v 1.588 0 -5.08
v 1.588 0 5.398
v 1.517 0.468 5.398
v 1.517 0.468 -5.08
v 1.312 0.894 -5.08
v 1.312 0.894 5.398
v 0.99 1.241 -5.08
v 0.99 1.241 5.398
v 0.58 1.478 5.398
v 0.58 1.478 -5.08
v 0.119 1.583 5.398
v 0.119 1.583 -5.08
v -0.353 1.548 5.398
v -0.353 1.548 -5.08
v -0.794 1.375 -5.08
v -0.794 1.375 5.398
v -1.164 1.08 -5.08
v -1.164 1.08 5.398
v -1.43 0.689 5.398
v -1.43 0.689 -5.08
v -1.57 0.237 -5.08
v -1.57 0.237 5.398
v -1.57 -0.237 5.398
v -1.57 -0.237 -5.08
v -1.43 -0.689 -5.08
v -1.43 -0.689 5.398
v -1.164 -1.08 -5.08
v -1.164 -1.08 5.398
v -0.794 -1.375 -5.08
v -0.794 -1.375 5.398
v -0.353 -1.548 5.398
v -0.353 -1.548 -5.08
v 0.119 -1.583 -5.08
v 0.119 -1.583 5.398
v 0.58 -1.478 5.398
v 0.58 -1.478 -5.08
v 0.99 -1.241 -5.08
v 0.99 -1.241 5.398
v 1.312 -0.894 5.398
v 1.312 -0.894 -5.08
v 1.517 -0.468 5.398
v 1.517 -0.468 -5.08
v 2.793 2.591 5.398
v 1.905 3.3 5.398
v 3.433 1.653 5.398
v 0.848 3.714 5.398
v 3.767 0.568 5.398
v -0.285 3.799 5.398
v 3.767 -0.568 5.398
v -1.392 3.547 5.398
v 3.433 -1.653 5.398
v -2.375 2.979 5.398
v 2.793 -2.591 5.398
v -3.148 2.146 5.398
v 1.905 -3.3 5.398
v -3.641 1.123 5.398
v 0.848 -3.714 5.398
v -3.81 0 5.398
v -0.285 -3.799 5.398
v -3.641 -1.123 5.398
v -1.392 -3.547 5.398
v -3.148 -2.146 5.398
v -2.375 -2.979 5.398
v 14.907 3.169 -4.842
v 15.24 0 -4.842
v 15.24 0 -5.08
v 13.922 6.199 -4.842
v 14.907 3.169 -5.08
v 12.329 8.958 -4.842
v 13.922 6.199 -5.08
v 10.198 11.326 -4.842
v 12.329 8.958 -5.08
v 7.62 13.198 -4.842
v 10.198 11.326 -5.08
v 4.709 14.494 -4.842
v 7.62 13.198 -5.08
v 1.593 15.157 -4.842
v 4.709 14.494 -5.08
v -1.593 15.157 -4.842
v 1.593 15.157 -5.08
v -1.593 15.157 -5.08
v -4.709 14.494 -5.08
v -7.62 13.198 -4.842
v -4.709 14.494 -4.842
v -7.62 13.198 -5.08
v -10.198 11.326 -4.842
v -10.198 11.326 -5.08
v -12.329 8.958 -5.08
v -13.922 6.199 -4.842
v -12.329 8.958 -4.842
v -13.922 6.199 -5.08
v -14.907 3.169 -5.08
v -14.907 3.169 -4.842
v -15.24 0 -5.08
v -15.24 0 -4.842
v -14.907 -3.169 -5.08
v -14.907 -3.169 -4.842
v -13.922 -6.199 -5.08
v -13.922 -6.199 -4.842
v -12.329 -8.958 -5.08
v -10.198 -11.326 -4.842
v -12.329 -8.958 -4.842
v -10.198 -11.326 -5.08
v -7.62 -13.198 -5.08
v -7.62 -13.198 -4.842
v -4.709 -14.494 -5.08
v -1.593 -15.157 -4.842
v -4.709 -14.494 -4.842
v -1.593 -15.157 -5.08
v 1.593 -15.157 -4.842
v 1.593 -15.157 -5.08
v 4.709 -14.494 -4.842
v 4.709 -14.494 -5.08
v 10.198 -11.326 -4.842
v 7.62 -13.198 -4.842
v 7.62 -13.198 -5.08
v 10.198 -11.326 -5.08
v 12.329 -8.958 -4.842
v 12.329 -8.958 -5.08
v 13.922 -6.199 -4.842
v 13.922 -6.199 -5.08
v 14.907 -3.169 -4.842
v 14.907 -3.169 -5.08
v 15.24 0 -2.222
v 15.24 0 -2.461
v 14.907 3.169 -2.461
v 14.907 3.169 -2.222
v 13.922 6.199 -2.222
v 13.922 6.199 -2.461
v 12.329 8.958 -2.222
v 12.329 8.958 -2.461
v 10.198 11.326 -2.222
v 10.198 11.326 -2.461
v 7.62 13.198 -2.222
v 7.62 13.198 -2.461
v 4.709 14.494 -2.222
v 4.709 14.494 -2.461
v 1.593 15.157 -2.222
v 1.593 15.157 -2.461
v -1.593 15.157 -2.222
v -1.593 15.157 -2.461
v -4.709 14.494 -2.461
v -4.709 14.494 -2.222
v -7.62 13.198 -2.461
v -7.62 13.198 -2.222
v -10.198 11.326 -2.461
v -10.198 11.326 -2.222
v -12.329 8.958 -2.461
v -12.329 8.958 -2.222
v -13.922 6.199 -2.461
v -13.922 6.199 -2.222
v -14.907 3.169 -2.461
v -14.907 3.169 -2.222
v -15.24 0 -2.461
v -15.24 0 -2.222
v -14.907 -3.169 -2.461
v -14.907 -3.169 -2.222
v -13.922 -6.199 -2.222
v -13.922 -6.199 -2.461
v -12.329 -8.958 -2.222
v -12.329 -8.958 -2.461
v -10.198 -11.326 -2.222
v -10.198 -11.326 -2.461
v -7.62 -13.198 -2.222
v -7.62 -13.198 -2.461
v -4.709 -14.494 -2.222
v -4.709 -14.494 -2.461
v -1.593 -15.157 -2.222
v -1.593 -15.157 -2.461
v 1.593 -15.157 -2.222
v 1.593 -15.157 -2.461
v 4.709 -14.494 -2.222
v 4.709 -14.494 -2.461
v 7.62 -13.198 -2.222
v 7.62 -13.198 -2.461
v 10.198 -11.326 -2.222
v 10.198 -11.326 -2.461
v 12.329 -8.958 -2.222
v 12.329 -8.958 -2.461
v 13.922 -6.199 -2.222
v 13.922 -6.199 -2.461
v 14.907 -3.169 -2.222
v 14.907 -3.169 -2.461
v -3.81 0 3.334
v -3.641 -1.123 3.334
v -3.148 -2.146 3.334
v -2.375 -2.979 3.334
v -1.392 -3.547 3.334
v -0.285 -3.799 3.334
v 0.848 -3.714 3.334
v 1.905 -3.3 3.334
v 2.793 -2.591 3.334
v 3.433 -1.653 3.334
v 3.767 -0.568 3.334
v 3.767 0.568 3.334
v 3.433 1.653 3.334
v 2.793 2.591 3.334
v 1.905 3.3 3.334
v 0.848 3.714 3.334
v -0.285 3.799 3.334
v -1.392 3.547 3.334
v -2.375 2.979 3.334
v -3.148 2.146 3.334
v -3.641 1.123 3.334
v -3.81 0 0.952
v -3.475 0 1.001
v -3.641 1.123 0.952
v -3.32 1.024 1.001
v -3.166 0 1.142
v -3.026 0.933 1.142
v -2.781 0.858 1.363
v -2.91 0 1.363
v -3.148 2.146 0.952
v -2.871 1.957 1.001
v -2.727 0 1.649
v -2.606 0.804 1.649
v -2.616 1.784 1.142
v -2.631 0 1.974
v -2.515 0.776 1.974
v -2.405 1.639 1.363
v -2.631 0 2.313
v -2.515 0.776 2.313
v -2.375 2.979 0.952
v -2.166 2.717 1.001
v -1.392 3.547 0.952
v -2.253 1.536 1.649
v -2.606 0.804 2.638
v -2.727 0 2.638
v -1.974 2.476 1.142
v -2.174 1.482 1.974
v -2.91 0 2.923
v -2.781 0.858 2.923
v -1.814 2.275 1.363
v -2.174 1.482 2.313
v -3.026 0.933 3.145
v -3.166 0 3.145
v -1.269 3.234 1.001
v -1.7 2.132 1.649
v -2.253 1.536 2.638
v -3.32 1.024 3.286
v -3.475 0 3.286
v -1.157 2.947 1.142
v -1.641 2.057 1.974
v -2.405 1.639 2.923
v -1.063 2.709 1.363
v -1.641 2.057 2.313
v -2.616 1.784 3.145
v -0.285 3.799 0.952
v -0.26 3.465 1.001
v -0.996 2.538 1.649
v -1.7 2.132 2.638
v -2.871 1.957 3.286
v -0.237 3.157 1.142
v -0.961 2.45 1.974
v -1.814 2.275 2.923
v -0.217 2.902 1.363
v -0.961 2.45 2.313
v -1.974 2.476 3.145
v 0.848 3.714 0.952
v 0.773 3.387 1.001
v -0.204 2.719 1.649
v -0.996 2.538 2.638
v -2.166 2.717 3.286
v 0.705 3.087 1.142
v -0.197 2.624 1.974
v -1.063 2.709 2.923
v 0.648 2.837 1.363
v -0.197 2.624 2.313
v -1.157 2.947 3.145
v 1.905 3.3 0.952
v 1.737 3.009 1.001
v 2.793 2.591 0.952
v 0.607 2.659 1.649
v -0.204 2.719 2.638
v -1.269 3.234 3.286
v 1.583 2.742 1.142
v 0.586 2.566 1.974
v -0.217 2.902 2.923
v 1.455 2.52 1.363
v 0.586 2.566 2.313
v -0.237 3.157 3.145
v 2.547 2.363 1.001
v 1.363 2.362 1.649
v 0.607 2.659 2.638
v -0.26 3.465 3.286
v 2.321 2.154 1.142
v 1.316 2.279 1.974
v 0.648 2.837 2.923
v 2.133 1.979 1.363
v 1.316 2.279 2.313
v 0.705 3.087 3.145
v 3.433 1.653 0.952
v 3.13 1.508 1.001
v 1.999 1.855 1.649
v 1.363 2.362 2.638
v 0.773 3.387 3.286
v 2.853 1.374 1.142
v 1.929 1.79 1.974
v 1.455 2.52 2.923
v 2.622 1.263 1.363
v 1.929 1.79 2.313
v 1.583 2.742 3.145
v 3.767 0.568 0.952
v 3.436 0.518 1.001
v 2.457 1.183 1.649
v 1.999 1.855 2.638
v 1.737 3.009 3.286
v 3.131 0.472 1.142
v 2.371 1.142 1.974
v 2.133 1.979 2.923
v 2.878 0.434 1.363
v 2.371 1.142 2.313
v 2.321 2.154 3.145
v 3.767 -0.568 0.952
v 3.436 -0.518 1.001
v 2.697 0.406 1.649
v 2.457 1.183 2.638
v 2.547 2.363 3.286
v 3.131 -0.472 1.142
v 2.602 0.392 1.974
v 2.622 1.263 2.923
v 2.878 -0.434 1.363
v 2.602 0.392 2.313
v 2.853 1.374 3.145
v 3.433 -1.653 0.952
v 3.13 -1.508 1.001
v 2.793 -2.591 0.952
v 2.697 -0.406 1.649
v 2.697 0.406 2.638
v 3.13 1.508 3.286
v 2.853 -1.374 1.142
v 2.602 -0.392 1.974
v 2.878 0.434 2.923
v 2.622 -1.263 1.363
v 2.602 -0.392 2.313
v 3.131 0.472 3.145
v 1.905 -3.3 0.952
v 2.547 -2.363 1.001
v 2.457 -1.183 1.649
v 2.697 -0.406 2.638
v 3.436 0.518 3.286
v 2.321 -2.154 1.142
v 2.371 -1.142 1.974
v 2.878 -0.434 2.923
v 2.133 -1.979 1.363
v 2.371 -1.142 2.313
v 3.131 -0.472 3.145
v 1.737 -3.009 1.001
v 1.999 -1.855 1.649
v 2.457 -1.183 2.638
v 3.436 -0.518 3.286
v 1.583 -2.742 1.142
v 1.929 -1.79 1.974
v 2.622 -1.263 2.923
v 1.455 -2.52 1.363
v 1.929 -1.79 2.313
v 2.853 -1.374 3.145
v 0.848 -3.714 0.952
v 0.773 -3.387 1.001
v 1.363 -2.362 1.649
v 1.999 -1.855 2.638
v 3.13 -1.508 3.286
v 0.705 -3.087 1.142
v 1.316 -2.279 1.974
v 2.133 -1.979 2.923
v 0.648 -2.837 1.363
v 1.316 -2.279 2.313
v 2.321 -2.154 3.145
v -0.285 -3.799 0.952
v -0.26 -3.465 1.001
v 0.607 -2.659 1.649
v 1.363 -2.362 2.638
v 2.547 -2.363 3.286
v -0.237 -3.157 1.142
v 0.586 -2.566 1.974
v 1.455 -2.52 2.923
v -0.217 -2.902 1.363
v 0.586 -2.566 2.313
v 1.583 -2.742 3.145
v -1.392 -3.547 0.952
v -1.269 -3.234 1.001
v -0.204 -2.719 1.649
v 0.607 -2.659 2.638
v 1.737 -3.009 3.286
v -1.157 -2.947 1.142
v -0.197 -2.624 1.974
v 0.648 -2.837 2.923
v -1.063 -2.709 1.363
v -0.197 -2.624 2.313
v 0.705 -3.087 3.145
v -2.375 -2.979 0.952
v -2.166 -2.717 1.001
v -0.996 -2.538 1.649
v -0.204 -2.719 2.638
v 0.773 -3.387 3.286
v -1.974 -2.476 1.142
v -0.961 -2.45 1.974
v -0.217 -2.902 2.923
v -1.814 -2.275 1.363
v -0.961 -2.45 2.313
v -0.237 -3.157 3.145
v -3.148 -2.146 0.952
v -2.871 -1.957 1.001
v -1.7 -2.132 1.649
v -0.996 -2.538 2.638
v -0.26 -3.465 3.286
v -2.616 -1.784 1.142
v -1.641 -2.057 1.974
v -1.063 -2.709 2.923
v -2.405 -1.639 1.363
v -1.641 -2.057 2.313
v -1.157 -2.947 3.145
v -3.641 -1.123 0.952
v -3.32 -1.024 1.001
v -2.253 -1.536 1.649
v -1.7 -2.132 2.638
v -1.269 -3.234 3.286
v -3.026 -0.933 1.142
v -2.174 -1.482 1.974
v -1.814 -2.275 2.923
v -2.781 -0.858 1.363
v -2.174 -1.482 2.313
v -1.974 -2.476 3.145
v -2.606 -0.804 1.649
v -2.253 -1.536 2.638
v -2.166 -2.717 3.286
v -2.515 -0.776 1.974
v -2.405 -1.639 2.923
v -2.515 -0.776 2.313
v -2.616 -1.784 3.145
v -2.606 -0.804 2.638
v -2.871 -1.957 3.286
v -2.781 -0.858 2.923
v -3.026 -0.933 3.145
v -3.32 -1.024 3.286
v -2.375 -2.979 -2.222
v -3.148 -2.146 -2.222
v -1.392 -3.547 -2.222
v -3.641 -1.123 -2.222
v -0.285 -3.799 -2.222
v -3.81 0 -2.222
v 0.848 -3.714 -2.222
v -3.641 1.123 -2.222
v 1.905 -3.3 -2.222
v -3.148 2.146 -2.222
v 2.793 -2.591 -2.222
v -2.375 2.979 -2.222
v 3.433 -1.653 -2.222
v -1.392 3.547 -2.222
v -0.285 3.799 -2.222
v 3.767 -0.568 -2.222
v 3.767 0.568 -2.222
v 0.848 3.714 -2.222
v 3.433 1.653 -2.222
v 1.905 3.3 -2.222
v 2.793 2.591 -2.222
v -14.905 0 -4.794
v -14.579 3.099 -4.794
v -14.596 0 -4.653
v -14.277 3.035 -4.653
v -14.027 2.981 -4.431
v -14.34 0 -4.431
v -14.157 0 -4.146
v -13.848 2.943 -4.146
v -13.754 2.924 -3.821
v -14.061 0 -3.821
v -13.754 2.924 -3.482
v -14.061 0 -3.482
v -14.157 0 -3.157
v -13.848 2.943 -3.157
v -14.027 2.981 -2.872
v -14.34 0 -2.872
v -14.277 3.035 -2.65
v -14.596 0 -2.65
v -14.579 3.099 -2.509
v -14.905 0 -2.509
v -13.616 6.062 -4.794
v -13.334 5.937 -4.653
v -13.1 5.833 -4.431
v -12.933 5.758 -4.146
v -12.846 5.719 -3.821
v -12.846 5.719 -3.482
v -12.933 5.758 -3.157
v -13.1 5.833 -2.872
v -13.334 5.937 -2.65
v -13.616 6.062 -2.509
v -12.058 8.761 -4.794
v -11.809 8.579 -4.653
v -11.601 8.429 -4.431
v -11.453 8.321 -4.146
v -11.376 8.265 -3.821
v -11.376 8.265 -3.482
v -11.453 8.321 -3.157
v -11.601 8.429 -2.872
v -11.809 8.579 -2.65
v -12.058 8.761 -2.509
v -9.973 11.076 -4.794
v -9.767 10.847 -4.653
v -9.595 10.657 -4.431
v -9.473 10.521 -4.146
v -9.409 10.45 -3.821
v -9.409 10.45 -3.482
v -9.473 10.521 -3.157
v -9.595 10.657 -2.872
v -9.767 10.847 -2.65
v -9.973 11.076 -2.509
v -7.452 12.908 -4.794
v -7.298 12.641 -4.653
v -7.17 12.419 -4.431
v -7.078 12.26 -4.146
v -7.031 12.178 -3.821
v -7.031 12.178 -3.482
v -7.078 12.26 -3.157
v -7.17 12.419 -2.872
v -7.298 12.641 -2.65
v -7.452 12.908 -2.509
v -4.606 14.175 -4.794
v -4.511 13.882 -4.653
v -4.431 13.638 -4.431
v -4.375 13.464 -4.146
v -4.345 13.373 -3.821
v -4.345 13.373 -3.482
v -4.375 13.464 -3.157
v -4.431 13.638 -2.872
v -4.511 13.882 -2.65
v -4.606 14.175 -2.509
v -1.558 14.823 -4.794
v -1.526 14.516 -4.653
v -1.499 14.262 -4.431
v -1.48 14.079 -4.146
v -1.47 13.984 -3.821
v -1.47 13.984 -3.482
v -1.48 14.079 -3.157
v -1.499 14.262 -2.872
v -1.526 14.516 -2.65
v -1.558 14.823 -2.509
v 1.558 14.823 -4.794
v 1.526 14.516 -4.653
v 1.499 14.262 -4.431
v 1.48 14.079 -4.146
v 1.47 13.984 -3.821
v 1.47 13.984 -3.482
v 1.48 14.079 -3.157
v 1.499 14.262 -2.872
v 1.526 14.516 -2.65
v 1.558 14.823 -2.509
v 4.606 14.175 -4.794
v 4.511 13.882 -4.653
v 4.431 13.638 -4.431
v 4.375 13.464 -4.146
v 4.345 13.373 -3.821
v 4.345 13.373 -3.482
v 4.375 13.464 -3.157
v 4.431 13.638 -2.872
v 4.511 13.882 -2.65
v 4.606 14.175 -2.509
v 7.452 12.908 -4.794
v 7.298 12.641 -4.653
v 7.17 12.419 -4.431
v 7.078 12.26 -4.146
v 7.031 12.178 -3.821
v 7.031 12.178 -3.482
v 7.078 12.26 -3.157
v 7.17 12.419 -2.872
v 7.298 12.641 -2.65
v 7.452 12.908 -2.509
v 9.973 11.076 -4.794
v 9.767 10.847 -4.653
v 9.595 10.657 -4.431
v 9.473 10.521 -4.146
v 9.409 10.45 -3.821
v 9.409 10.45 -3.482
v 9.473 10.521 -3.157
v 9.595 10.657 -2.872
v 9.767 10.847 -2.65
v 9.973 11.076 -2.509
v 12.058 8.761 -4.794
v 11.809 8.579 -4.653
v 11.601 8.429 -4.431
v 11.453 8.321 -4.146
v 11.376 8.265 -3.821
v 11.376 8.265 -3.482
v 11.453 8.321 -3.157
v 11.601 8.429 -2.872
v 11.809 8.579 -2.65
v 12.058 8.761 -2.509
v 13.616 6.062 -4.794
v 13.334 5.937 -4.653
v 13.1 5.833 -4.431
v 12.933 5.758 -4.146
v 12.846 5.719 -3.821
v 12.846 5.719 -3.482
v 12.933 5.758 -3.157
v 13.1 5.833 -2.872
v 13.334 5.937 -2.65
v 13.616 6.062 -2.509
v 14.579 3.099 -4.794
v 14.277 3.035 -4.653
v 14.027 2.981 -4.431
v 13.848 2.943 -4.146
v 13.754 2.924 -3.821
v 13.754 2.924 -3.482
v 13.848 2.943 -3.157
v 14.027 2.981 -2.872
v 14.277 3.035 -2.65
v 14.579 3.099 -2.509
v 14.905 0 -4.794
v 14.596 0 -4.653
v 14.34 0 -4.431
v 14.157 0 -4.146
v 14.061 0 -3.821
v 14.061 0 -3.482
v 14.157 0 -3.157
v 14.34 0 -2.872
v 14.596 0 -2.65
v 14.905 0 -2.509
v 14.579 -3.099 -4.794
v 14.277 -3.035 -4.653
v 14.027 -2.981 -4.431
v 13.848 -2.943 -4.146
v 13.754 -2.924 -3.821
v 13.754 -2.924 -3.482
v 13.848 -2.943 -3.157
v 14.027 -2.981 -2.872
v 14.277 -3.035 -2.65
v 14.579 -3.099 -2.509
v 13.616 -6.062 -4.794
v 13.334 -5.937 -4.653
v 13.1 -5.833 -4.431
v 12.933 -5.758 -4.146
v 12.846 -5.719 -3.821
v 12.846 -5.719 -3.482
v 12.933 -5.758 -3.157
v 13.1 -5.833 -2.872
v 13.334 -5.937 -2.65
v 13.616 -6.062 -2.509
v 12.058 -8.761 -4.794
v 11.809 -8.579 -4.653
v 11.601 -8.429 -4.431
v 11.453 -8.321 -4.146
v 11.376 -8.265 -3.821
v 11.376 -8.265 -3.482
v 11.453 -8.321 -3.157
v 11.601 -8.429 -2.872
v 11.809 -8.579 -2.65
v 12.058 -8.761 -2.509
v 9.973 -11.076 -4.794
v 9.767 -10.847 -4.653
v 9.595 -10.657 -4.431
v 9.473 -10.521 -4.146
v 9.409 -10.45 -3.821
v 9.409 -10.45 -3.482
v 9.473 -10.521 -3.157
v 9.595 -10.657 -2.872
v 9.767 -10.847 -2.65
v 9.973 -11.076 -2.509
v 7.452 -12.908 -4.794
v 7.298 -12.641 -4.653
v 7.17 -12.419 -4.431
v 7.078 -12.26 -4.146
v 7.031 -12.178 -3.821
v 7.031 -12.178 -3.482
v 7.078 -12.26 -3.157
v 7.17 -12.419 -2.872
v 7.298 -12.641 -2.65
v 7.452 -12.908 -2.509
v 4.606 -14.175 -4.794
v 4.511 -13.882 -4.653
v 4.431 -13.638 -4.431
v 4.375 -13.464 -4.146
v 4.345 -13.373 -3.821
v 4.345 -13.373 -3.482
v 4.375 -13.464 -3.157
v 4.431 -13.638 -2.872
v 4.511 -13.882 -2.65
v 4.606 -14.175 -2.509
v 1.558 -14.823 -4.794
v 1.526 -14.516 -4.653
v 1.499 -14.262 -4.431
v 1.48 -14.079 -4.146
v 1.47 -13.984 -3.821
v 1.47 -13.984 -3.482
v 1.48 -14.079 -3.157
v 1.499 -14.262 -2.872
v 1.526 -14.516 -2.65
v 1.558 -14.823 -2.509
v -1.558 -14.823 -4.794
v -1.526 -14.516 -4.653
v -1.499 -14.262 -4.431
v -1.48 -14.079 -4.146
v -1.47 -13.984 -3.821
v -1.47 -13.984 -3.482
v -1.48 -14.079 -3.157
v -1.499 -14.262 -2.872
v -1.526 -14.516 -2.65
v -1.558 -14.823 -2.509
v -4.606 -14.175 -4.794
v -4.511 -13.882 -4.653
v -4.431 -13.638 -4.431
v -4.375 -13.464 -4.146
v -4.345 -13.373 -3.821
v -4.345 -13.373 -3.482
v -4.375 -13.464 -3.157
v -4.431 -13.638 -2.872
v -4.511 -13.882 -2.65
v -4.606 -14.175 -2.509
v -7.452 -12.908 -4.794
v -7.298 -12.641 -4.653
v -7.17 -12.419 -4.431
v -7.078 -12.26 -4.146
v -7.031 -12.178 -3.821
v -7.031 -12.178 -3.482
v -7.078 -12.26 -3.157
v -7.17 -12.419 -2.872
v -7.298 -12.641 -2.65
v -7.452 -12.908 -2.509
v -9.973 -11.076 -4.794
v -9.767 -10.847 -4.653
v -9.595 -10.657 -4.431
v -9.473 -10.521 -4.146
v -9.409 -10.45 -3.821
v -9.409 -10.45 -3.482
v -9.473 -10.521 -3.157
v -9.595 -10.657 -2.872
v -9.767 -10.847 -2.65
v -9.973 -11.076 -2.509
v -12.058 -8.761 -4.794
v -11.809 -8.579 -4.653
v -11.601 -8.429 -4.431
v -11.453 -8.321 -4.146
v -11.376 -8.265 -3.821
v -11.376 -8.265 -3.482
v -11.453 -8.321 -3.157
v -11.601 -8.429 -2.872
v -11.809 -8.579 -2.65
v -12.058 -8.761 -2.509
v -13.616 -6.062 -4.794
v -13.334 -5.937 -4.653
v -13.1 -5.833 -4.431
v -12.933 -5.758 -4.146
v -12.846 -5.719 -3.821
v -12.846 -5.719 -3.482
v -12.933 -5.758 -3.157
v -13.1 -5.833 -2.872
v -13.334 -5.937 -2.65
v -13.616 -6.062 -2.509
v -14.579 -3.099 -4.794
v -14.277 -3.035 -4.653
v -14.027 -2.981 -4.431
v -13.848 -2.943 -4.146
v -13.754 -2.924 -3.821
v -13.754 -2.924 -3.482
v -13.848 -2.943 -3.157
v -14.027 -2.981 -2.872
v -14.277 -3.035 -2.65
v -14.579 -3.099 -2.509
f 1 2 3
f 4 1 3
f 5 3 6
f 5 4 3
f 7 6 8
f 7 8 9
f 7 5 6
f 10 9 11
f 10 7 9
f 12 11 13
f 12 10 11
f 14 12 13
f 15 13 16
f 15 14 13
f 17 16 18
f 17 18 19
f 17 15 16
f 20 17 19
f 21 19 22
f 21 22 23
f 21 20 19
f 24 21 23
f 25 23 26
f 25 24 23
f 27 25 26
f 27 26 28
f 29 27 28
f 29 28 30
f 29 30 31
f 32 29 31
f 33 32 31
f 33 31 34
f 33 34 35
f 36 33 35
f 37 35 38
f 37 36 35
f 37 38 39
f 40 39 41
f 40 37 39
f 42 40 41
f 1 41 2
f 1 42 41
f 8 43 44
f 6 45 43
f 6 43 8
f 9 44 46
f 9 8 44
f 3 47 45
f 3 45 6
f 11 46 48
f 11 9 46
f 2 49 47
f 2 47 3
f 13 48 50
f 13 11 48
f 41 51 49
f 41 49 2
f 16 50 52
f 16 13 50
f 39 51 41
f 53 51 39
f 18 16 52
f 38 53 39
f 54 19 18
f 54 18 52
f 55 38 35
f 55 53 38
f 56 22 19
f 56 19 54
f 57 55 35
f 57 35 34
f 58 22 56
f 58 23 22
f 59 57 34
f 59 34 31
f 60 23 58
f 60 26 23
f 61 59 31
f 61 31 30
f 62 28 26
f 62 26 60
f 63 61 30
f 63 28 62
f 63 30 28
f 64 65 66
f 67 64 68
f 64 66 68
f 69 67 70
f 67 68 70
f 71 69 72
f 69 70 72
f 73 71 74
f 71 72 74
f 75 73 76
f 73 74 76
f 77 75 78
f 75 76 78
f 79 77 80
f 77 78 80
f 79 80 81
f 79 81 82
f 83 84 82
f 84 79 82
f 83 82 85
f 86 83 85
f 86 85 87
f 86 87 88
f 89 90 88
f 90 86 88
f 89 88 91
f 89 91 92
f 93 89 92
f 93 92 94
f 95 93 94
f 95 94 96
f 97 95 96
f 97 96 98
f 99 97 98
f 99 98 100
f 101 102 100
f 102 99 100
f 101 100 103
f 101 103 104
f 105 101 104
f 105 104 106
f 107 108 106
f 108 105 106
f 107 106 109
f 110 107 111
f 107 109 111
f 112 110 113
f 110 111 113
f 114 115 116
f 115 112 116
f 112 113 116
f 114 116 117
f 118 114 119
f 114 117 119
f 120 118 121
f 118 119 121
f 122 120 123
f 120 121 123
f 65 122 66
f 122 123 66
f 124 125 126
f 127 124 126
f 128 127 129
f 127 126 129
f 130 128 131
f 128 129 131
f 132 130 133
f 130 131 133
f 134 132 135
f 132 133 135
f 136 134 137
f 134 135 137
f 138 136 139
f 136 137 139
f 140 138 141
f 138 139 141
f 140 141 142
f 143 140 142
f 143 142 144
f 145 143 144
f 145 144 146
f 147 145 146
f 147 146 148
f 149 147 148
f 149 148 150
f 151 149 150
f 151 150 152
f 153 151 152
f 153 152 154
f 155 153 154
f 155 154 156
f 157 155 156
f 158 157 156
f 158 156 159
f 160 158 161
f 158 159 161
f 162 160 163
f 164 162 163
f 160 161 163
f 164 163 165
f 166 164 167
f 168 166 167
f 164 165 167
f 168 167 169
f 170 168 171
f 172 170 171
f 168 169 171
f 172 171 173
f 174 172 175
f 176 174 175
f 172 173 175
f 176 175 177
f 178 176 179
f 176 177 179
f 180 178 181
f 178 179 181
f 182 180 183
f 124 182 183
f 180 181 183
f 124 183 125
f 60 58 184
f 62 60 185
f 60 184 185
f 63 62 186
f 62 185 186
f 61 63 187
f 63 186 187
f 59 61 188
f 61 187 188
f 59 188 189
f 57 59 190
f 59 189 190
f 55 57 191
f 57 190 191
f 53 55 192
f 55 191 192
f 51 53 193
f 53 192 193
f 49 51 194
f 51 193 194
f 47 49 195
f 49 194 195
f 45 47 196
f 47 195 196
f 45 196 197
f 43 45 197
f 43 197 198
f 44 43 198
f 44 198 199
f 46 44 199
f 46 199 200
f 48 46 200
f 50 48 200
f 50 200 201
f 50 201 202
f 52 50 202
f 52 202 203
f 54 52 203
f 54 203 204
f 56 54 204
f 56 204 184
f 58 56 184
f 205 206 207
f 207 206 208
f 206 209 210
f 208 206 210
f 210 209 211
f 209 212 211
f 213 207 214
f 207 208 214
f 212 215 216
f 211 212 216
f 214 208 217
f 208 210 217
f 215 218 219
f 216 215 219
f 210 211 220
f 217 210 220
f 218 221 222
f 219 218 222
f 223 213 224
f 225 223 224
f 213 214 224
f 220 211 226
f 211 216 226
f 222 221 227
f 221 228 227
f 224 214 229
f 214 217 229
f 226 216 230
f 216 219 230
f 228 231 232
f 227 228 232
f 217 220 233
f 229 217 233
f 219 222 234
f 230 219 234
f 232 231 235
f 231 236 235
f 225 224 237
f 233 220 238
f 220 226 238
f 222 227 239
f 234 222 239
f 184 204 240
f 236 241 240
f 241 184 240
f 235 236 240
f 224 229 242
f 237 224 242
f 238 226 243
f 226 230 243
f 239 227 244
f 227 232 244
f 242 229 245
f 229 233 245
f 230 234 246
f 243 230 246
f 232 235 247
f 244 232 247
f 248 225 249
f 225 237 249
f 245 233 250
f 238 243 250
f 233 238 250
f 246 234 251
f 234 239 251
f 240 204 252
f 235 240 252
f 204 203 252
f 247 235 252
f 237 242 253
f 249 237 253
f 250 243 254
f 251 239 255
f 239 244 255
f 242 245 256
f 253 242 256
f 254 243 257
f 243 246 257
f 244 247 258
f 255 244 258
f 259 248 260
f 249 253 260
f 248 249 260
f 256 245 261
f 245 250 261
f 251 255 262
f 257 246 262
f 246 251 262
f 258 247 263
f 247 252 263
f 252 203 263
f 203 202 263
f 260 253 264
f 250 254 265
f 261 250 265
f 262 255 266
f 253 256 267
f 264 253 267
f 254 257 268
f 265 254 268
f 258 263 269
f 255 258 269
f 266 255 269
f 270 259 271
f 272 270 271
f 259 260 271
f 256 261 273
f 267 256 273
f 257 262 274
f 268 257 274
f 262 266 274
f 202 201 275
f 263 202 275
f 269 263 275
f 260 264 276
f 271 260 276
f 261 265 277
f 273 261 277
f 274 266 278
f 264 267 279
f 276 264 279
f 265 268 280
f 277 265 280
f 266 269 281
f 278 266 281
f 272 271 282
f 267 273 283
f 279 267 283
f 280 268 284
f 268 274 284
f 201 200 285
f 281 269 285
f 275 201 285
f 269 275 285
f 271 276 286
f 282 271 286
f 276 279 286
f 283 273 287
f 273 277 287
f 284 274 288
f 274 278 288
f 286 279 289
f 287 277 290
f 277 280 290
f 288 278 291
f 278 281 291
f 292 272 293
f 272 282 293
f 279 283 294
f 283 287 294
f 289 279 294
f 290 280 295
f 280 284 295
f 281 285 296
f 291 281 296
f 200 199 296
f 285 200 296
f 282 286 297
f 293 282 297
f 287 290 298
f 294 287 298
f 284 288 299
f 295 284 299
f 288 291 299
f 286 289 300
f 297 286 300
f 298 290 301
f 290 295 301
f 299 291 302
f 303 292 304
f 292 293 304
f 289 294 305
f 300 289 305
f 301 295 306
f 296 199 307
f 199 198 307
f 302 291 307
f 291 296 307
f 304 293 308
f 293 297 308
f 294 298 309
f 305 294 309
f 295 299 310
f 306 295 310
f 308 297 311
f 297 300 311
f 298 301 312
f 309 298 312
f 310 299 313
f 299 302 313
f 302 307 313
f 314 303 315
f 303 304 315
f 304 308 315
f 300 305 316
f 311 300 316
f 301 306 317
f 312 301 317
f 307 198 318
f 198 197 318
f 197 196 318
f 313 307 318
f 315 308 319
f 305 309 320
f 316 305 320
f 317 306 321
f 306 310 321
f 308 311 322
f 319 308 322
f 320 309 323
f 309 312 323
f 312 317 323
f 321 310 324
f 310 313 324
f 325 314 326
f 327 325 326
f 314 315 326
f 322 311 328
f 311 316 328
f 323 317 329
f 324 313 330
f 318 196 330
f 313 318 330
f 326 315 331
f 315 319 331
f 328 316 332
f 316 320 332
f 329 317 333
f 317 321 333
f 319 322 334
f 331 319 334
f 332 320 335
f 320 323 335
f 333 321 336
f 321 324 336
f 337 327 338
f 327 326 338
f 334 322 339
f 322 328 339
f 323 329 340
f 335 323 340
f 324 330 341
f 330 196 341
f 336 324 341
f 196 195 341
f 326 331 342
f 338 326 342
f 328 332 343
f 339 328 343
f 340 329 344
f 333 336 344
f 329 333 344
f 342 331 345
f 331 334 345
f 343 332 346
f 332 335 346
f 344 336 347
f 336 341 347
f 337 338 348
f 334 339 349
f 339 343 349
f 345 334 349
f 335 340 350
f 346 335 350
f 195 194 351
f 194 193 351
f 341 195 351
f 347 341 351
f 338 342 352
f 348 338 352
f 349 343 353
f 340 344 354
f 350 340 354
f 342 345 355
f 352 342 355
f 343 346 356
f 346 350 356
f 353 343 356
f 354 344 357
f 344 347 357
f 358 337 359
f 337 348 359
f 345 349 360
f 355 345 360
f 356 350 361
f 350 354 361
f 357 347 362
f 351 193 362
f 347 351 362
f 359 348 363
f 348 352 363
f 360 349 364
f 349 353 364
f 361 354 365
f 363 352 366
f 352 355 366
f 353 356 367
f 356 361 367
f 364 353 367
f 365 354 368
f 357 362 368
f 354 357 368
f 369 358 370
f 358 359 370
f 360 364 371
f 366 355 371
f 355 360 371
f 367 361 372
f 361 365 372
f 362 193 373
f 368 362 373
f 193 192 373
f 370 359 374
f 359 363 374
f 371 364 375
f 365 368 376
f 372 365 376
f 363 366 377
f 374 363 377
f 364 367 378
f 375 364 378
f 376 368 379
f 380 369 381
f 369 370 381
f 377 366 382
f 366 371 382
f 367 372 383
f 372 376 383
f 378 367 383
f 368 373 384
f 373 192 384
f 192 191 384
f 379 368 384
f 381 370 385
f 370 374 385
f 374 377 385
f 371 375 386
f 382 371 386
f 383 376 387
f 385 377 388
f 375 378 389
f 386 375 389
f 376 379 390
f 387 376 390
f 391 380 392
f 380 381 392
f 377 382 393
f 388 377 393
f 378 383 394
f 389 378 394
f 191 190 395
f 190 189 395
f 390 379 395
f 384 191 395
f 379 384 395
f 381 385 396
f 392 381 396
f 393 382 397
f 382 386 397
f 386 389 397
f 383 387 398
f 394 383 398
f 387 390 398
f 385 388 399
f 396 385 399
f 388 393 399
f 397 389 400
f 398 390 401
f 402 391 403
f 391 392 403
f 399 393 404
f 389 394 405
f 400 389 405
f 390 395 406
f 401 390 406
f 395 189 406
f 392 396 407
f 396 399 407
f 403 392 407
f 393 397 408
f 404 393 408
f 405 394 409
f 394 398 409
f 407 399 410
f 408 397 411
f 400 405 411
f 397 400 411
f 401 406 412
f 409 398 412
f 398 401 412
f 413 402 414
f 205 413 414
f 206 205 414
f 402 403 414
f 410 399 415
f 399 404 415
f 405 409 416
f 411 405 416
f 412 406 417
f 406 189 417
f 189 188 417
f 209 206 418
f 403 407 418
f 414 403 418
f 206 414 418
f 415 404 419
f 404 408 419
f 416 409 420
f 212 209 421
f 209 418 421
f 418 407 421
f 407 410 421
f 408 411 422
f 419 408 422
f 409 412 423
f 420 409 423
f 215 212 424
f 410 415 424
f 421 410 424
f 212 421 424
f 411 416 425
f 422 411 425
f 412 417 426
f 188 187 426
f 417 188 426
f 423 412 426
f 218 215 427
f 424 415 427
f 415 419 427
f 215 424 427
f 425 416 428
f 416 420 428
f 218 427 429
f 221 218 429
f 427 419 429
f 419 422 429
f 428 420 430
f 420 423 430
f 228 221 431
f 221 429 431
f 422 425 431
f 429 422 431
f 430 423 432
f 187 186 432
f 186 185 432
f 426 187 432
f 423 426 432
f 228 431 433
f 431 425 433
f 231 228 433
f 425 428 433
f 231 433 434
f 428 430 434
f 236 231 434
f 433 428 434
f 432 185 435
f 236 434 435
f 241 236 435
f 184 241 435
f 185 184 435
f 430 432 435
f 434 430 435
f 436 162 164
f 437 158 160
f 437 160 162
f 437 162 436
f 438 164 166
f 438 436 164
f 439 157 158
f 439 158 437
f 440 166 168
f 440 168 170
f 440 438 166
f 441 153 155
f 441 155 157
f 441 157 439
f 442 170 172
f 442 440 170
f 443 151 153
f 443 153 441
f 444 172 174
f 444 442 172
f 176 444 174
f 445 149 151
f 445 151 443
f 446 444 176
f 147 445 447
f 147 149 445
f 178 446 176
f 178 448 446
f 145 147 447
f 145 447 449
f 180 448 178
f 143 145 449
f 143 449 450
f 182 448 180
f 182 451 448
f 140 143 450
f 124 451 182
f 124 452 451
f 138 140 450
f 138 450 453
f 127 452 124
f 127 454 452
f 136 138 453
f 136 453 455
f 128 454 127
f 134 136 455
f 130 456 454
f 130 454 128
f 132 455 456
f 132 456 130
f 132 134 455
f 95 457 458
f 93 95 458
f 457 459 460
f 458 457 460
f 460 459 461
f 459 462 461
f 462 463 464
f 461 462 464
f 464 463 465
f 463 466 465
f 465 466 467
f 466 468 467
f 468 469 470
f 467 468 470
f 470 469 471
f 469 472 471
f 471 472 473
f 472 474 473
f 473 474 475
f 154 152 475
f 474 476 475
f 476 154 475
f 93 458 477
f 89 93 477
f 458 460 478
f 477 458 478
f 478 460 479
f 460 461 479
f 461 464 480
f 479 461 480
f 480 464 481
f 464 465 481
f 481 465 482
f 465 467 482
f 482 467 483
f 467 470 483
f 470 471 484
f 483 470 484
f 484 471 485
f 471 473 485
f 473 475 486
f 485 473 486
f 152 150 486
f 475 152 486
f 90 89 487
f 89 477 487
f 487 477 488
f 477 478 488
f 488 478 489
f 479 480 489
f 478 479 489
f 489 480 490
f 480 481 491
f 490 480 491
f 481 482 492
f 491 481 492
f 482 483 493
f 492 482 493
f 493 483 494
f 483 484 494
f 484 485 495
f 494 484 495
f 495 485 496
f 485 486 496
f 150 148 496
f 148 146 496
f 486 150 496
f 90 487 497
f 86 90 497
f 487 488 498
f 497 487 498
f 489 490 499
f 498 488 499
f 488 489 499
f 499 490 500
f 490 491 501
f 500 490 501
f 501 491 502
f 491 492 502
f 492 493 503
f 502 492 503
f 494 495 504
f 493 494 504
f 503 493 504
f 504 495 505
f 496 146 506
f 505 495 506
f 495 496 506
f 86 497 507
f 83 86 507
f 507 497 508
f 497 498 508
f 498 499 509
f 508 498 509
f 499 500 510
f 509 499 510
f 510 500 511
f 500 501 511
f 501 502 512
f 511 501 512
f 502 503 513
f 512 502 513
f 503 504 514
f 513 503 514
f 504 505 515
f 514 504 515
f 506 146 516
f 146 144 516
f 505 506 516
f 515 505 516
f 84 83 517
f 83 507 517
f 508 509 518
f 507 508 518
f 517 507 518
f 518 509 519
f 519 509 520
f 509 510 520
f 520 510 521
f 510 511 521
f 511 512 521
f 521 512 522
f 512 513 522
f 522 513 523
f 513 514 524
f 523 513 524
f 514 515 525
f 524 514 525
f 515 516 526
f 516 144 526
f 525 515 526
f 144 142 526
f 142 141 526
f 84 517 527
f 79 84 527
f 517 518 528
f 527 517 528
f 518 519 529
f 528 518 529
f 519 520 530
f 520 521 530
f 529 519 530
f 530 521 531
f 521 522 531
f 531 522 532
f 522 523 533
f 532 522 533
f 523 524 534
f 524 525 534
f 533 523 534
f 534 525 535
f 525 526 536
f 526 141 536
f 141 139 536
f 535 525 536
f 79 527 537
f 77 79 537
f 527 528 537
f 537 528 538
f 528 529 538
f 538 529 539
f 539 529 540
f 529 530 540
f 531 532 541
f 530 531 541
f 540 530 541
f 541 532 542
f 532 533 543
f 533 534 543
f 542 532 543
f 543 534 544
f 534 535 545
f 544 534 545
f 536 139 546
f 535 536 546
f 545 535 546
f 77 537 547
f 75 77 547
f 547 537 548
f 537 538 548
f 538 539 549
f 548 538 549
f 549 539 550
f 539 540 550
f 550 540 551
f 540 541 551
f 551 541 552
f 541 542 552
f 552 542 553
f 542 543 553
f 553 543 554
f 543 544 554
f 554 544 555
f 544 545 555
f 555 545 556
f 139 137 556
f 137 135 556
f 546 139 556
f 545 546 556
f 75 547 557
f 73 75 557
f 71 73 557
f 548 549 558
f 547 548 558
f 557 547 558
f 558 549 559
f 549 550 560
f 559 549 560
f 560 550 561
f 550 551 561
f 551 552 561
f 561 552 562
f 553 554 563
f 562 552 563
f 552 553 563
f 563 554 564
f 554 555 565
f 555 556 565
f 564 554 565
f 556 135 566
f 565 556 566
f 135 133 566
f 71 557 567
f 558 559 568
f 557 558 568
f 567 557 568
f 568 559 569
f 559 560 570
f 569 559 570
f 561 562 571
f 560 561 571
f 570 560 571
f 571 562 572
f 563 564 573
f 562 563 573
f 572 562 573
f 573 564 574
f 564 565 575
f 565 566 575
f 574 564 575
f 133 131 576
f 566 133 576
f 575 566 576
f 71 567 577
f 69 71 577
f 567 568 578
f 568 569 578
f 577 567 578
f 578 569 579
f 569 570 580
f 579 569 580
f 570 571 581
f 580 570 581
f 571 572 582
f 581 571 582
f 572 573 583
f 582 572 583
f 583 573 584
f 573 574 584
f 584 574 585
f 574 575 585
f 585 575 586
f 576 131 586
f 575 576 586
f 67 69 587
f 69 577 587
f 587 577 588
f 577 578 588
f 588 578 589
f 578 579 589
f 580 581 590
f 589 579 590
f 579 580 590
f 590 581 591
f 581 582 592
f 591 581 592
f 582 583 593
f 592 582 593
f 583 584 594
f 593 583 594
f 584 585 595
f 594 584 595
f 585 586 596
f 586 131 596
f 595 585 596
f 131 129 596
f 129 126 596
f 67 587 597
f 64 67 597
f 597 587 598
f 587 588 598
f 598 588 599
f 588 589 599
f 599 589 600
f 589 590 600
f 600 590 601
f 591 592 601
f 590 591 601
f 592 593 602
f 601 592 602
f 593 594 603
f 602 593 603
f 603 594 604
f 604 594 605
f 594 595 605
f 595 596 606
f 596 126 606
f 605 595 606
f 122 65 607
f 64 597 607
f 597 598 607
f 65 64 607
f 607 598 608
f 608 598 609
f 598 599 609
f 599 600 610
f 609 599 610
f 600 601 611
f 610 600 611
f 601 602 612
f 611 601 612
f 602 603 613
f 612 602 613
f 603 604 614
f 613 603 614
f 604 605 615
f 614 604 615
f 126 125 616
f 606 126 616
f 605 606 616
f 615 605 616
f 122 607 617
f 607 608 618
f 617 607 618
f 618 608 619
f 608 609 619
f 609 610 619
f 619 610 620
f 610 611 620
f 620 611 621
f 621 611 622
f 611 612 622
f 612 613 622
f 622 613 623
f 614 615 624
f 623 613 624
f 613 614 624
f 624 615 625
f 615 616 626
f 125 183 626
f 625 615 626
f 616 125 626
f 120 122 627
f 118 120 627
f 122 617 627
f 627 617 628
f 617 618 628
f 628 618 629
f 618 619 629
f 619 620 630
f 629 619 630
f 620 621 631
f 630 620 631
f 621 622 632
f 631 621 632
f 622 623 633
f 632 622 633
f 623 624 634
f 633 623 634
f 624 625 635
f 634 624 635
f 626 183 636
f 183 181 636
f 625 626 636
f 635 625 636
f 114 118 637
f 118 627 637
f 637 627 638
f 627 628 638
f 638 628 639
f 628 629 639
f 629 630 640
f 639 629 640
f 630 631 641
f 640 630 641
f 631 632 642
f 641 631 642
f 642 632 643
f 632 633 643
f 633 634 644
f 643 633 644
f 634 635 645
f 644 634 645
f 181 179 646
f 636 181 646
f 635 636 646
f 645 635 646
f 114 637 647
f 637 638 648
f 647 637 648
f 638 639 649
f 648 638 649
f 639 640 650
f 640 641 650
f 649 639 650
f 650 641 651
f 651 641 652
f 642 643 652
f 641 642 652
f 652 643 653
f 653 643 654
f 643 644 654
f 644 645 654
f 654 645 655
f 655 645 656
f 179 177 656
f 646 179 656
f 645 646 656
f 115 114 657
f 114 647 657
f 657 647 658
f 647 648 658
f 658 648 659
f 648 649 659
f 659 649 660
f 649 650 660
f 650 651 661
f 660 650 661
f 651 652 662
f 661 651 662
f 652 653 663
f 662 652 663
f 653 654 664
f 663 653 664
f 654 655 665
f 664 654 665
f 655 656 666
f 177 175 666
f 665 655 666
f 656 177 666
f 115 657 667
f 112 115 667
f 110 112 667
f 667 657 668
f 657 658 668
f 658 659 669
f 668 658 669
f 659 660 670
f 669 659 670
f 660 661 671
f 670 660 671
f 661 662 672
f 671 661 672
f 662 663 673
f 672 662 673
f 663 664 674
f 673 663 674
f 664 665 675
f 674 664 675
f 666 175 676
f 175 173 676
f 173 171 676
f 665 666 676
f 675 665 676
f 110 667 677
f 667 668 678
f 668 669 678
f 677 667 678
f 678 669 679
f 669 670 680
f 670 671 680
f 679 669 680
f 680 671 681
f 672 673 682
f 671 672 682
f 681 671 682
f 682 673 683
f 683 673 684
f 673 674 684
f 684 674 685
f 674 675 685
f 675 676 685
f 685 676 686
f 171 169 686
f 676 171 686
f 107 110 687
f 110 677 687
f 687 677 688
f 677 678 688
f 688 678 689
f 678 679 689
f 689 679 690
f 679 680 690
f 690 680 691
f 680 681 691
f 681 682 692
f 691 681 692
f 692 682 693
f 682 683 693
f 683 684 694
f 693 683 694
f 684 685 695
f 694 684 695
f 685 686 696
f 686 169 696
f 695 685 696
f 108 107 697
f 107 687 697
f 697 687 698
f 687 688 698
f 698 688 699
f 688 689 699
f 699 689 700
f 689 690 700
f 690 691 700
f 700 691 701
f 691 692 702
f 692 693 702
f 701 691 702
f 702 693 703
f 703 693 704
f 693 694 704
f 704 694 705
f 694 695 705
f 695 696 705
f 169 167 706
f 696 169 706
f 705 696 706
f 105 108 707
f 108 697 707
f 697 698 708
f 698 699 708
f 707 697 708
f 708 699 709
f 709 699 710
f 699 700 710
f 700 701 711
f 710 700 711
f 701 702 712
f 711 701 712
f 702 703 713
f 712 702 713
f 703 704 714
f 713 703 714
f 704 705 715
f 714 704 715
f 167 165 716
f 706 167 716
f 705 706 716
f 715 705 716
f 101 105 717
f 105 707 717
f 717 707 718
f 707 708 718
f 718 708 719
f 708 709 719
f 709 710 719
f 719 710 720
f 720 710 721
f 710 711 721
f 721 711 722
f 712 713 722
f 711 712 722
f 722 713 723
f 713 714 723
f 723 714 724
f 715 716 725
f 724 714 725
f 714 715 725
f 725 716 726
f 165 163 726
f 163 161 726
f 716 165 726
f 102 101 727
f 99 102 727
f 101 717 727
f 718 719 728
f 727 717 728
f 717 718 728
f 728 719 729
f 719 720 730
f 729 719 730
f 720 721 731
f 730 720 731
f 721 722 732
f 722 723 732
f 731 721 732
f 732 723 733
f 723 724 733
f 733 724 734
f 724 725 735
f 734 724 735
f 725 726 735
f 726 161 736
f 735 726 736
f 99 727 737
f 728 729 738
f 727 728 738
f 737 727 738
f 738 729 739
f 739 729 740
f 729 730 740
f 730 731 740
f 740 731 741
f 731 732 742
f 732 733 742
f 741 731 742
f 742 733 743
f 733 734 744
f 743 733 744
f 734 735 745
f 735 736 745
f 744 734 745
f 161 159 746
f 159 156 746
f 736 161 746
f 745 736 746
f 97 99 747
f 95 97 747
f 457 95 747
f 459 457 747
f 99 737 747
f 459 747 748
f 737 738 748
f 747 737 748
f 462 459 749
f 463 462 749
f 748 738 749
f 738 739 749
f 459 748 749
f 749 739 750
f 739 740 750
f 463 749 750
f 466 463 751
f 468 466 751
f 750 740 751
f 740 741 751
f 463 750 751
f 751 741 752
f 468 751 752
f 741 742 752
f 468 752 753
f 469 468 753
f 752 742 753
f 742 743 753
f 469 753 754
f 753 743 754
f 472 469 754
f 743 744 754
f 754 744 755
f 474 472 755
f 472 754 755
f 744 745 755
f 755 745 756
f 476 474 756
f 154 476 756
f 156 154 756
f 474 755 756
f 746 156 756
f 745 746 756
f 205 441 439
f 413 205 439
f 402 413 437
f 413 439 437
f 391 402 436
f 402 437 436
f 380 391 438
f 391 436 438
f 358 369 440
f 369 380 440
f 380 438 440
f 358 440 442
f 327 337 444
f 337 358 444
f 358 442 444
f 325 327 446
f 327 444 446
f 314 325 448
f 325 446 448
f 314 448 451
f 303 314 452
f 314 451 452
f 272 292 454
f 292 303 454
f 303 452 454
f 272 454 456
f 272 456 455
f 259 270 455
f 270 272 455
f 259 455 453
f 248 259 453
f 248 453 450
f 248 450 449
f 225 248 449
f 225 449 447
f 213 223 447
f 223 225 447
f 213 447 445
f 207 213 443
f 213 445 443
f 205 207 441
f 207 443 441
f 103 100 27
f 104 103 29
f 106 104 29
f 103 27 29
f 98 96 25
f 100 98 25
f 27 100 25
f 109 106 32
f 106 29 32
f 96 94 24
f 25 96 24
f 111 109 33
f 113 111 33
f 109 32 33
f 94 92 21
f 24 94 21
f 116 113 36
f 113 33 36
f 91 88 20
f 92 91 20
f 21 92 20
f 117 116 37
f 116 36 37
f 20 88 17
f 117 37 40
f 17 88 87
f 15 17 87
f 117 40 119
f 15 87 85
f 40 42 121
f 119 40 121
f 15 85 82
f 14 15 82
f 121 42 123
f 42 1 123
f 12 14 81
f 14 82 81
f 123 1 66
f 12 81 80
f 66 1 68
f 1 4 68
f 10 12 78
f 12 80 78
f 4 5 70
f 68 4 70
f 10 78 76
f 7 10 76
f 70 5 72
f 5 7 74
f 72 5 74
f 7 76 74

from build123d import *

# Parameters (mm, degrees)
BOSS_EXTRUDE1_START = -5.08
SKETCH1_R           = 15.24
SKETCH1_R_2         = 1.5875
BOSS_EXTRUDE1_DEPTH = 2.8575
SKETCH2_R           = 3.81
SKETCH2_R_2         = 1.5875
BOSS_EXTRUDE2_DEPTH = 7.62
SKETCH3_R           = 1.190625


with BuildPart() as part:
    # Sketch1 → Boss-Extrude1 (new body)
    with BuildSketch(Plane.XY.offset(BOSS_EXTRUDE1_START)):
        Circle(SKETCH1_R)
        Circle(SKETCH1_R_2, mode=Mode.SUBTRACT)
    extrude(amount=BOSS_EXTRUDE1_DEPTH)

    # Sketch2 → Boss-Extrude2 (add)
    with BuildSketch(Plane.XY.offset(-2.2225)):
        with Locations(Location((0, 0, 0), (0, 0, 180))):
            Circle(SKETCH2_R)
        Circle(SKETCH2_R_2, mode=Mode.SUBTRACT)
    extrude(amount=BOSS_EXTRUDE2_DEPTH)

    # Sketch3 → Cut-Revolve1 (revolve, cut)
    with BuildSketch(Plane(origin=(0, 0, 0), x_dir=(1, 0, 0), z_dir=(0, 1, 0)), mode=Mode.PRIVATE) as cut_revolve1_sk:
        with Locations((3.81, -2.143125)):
            Circle(SKETCH3_R)
        with Locations((15.24, 3.65125)):
            Circle(SKETCH3_R)
    revolve(cut_revolve1_sk.sketch.rotate(Axis((0, 0, -2.2225), (0, 0, -1)), 180), axis=Axis((0, 0, -2.2225), (0, 0, -1)), mode=Mode.SUBTRACT)


solid = part.part
